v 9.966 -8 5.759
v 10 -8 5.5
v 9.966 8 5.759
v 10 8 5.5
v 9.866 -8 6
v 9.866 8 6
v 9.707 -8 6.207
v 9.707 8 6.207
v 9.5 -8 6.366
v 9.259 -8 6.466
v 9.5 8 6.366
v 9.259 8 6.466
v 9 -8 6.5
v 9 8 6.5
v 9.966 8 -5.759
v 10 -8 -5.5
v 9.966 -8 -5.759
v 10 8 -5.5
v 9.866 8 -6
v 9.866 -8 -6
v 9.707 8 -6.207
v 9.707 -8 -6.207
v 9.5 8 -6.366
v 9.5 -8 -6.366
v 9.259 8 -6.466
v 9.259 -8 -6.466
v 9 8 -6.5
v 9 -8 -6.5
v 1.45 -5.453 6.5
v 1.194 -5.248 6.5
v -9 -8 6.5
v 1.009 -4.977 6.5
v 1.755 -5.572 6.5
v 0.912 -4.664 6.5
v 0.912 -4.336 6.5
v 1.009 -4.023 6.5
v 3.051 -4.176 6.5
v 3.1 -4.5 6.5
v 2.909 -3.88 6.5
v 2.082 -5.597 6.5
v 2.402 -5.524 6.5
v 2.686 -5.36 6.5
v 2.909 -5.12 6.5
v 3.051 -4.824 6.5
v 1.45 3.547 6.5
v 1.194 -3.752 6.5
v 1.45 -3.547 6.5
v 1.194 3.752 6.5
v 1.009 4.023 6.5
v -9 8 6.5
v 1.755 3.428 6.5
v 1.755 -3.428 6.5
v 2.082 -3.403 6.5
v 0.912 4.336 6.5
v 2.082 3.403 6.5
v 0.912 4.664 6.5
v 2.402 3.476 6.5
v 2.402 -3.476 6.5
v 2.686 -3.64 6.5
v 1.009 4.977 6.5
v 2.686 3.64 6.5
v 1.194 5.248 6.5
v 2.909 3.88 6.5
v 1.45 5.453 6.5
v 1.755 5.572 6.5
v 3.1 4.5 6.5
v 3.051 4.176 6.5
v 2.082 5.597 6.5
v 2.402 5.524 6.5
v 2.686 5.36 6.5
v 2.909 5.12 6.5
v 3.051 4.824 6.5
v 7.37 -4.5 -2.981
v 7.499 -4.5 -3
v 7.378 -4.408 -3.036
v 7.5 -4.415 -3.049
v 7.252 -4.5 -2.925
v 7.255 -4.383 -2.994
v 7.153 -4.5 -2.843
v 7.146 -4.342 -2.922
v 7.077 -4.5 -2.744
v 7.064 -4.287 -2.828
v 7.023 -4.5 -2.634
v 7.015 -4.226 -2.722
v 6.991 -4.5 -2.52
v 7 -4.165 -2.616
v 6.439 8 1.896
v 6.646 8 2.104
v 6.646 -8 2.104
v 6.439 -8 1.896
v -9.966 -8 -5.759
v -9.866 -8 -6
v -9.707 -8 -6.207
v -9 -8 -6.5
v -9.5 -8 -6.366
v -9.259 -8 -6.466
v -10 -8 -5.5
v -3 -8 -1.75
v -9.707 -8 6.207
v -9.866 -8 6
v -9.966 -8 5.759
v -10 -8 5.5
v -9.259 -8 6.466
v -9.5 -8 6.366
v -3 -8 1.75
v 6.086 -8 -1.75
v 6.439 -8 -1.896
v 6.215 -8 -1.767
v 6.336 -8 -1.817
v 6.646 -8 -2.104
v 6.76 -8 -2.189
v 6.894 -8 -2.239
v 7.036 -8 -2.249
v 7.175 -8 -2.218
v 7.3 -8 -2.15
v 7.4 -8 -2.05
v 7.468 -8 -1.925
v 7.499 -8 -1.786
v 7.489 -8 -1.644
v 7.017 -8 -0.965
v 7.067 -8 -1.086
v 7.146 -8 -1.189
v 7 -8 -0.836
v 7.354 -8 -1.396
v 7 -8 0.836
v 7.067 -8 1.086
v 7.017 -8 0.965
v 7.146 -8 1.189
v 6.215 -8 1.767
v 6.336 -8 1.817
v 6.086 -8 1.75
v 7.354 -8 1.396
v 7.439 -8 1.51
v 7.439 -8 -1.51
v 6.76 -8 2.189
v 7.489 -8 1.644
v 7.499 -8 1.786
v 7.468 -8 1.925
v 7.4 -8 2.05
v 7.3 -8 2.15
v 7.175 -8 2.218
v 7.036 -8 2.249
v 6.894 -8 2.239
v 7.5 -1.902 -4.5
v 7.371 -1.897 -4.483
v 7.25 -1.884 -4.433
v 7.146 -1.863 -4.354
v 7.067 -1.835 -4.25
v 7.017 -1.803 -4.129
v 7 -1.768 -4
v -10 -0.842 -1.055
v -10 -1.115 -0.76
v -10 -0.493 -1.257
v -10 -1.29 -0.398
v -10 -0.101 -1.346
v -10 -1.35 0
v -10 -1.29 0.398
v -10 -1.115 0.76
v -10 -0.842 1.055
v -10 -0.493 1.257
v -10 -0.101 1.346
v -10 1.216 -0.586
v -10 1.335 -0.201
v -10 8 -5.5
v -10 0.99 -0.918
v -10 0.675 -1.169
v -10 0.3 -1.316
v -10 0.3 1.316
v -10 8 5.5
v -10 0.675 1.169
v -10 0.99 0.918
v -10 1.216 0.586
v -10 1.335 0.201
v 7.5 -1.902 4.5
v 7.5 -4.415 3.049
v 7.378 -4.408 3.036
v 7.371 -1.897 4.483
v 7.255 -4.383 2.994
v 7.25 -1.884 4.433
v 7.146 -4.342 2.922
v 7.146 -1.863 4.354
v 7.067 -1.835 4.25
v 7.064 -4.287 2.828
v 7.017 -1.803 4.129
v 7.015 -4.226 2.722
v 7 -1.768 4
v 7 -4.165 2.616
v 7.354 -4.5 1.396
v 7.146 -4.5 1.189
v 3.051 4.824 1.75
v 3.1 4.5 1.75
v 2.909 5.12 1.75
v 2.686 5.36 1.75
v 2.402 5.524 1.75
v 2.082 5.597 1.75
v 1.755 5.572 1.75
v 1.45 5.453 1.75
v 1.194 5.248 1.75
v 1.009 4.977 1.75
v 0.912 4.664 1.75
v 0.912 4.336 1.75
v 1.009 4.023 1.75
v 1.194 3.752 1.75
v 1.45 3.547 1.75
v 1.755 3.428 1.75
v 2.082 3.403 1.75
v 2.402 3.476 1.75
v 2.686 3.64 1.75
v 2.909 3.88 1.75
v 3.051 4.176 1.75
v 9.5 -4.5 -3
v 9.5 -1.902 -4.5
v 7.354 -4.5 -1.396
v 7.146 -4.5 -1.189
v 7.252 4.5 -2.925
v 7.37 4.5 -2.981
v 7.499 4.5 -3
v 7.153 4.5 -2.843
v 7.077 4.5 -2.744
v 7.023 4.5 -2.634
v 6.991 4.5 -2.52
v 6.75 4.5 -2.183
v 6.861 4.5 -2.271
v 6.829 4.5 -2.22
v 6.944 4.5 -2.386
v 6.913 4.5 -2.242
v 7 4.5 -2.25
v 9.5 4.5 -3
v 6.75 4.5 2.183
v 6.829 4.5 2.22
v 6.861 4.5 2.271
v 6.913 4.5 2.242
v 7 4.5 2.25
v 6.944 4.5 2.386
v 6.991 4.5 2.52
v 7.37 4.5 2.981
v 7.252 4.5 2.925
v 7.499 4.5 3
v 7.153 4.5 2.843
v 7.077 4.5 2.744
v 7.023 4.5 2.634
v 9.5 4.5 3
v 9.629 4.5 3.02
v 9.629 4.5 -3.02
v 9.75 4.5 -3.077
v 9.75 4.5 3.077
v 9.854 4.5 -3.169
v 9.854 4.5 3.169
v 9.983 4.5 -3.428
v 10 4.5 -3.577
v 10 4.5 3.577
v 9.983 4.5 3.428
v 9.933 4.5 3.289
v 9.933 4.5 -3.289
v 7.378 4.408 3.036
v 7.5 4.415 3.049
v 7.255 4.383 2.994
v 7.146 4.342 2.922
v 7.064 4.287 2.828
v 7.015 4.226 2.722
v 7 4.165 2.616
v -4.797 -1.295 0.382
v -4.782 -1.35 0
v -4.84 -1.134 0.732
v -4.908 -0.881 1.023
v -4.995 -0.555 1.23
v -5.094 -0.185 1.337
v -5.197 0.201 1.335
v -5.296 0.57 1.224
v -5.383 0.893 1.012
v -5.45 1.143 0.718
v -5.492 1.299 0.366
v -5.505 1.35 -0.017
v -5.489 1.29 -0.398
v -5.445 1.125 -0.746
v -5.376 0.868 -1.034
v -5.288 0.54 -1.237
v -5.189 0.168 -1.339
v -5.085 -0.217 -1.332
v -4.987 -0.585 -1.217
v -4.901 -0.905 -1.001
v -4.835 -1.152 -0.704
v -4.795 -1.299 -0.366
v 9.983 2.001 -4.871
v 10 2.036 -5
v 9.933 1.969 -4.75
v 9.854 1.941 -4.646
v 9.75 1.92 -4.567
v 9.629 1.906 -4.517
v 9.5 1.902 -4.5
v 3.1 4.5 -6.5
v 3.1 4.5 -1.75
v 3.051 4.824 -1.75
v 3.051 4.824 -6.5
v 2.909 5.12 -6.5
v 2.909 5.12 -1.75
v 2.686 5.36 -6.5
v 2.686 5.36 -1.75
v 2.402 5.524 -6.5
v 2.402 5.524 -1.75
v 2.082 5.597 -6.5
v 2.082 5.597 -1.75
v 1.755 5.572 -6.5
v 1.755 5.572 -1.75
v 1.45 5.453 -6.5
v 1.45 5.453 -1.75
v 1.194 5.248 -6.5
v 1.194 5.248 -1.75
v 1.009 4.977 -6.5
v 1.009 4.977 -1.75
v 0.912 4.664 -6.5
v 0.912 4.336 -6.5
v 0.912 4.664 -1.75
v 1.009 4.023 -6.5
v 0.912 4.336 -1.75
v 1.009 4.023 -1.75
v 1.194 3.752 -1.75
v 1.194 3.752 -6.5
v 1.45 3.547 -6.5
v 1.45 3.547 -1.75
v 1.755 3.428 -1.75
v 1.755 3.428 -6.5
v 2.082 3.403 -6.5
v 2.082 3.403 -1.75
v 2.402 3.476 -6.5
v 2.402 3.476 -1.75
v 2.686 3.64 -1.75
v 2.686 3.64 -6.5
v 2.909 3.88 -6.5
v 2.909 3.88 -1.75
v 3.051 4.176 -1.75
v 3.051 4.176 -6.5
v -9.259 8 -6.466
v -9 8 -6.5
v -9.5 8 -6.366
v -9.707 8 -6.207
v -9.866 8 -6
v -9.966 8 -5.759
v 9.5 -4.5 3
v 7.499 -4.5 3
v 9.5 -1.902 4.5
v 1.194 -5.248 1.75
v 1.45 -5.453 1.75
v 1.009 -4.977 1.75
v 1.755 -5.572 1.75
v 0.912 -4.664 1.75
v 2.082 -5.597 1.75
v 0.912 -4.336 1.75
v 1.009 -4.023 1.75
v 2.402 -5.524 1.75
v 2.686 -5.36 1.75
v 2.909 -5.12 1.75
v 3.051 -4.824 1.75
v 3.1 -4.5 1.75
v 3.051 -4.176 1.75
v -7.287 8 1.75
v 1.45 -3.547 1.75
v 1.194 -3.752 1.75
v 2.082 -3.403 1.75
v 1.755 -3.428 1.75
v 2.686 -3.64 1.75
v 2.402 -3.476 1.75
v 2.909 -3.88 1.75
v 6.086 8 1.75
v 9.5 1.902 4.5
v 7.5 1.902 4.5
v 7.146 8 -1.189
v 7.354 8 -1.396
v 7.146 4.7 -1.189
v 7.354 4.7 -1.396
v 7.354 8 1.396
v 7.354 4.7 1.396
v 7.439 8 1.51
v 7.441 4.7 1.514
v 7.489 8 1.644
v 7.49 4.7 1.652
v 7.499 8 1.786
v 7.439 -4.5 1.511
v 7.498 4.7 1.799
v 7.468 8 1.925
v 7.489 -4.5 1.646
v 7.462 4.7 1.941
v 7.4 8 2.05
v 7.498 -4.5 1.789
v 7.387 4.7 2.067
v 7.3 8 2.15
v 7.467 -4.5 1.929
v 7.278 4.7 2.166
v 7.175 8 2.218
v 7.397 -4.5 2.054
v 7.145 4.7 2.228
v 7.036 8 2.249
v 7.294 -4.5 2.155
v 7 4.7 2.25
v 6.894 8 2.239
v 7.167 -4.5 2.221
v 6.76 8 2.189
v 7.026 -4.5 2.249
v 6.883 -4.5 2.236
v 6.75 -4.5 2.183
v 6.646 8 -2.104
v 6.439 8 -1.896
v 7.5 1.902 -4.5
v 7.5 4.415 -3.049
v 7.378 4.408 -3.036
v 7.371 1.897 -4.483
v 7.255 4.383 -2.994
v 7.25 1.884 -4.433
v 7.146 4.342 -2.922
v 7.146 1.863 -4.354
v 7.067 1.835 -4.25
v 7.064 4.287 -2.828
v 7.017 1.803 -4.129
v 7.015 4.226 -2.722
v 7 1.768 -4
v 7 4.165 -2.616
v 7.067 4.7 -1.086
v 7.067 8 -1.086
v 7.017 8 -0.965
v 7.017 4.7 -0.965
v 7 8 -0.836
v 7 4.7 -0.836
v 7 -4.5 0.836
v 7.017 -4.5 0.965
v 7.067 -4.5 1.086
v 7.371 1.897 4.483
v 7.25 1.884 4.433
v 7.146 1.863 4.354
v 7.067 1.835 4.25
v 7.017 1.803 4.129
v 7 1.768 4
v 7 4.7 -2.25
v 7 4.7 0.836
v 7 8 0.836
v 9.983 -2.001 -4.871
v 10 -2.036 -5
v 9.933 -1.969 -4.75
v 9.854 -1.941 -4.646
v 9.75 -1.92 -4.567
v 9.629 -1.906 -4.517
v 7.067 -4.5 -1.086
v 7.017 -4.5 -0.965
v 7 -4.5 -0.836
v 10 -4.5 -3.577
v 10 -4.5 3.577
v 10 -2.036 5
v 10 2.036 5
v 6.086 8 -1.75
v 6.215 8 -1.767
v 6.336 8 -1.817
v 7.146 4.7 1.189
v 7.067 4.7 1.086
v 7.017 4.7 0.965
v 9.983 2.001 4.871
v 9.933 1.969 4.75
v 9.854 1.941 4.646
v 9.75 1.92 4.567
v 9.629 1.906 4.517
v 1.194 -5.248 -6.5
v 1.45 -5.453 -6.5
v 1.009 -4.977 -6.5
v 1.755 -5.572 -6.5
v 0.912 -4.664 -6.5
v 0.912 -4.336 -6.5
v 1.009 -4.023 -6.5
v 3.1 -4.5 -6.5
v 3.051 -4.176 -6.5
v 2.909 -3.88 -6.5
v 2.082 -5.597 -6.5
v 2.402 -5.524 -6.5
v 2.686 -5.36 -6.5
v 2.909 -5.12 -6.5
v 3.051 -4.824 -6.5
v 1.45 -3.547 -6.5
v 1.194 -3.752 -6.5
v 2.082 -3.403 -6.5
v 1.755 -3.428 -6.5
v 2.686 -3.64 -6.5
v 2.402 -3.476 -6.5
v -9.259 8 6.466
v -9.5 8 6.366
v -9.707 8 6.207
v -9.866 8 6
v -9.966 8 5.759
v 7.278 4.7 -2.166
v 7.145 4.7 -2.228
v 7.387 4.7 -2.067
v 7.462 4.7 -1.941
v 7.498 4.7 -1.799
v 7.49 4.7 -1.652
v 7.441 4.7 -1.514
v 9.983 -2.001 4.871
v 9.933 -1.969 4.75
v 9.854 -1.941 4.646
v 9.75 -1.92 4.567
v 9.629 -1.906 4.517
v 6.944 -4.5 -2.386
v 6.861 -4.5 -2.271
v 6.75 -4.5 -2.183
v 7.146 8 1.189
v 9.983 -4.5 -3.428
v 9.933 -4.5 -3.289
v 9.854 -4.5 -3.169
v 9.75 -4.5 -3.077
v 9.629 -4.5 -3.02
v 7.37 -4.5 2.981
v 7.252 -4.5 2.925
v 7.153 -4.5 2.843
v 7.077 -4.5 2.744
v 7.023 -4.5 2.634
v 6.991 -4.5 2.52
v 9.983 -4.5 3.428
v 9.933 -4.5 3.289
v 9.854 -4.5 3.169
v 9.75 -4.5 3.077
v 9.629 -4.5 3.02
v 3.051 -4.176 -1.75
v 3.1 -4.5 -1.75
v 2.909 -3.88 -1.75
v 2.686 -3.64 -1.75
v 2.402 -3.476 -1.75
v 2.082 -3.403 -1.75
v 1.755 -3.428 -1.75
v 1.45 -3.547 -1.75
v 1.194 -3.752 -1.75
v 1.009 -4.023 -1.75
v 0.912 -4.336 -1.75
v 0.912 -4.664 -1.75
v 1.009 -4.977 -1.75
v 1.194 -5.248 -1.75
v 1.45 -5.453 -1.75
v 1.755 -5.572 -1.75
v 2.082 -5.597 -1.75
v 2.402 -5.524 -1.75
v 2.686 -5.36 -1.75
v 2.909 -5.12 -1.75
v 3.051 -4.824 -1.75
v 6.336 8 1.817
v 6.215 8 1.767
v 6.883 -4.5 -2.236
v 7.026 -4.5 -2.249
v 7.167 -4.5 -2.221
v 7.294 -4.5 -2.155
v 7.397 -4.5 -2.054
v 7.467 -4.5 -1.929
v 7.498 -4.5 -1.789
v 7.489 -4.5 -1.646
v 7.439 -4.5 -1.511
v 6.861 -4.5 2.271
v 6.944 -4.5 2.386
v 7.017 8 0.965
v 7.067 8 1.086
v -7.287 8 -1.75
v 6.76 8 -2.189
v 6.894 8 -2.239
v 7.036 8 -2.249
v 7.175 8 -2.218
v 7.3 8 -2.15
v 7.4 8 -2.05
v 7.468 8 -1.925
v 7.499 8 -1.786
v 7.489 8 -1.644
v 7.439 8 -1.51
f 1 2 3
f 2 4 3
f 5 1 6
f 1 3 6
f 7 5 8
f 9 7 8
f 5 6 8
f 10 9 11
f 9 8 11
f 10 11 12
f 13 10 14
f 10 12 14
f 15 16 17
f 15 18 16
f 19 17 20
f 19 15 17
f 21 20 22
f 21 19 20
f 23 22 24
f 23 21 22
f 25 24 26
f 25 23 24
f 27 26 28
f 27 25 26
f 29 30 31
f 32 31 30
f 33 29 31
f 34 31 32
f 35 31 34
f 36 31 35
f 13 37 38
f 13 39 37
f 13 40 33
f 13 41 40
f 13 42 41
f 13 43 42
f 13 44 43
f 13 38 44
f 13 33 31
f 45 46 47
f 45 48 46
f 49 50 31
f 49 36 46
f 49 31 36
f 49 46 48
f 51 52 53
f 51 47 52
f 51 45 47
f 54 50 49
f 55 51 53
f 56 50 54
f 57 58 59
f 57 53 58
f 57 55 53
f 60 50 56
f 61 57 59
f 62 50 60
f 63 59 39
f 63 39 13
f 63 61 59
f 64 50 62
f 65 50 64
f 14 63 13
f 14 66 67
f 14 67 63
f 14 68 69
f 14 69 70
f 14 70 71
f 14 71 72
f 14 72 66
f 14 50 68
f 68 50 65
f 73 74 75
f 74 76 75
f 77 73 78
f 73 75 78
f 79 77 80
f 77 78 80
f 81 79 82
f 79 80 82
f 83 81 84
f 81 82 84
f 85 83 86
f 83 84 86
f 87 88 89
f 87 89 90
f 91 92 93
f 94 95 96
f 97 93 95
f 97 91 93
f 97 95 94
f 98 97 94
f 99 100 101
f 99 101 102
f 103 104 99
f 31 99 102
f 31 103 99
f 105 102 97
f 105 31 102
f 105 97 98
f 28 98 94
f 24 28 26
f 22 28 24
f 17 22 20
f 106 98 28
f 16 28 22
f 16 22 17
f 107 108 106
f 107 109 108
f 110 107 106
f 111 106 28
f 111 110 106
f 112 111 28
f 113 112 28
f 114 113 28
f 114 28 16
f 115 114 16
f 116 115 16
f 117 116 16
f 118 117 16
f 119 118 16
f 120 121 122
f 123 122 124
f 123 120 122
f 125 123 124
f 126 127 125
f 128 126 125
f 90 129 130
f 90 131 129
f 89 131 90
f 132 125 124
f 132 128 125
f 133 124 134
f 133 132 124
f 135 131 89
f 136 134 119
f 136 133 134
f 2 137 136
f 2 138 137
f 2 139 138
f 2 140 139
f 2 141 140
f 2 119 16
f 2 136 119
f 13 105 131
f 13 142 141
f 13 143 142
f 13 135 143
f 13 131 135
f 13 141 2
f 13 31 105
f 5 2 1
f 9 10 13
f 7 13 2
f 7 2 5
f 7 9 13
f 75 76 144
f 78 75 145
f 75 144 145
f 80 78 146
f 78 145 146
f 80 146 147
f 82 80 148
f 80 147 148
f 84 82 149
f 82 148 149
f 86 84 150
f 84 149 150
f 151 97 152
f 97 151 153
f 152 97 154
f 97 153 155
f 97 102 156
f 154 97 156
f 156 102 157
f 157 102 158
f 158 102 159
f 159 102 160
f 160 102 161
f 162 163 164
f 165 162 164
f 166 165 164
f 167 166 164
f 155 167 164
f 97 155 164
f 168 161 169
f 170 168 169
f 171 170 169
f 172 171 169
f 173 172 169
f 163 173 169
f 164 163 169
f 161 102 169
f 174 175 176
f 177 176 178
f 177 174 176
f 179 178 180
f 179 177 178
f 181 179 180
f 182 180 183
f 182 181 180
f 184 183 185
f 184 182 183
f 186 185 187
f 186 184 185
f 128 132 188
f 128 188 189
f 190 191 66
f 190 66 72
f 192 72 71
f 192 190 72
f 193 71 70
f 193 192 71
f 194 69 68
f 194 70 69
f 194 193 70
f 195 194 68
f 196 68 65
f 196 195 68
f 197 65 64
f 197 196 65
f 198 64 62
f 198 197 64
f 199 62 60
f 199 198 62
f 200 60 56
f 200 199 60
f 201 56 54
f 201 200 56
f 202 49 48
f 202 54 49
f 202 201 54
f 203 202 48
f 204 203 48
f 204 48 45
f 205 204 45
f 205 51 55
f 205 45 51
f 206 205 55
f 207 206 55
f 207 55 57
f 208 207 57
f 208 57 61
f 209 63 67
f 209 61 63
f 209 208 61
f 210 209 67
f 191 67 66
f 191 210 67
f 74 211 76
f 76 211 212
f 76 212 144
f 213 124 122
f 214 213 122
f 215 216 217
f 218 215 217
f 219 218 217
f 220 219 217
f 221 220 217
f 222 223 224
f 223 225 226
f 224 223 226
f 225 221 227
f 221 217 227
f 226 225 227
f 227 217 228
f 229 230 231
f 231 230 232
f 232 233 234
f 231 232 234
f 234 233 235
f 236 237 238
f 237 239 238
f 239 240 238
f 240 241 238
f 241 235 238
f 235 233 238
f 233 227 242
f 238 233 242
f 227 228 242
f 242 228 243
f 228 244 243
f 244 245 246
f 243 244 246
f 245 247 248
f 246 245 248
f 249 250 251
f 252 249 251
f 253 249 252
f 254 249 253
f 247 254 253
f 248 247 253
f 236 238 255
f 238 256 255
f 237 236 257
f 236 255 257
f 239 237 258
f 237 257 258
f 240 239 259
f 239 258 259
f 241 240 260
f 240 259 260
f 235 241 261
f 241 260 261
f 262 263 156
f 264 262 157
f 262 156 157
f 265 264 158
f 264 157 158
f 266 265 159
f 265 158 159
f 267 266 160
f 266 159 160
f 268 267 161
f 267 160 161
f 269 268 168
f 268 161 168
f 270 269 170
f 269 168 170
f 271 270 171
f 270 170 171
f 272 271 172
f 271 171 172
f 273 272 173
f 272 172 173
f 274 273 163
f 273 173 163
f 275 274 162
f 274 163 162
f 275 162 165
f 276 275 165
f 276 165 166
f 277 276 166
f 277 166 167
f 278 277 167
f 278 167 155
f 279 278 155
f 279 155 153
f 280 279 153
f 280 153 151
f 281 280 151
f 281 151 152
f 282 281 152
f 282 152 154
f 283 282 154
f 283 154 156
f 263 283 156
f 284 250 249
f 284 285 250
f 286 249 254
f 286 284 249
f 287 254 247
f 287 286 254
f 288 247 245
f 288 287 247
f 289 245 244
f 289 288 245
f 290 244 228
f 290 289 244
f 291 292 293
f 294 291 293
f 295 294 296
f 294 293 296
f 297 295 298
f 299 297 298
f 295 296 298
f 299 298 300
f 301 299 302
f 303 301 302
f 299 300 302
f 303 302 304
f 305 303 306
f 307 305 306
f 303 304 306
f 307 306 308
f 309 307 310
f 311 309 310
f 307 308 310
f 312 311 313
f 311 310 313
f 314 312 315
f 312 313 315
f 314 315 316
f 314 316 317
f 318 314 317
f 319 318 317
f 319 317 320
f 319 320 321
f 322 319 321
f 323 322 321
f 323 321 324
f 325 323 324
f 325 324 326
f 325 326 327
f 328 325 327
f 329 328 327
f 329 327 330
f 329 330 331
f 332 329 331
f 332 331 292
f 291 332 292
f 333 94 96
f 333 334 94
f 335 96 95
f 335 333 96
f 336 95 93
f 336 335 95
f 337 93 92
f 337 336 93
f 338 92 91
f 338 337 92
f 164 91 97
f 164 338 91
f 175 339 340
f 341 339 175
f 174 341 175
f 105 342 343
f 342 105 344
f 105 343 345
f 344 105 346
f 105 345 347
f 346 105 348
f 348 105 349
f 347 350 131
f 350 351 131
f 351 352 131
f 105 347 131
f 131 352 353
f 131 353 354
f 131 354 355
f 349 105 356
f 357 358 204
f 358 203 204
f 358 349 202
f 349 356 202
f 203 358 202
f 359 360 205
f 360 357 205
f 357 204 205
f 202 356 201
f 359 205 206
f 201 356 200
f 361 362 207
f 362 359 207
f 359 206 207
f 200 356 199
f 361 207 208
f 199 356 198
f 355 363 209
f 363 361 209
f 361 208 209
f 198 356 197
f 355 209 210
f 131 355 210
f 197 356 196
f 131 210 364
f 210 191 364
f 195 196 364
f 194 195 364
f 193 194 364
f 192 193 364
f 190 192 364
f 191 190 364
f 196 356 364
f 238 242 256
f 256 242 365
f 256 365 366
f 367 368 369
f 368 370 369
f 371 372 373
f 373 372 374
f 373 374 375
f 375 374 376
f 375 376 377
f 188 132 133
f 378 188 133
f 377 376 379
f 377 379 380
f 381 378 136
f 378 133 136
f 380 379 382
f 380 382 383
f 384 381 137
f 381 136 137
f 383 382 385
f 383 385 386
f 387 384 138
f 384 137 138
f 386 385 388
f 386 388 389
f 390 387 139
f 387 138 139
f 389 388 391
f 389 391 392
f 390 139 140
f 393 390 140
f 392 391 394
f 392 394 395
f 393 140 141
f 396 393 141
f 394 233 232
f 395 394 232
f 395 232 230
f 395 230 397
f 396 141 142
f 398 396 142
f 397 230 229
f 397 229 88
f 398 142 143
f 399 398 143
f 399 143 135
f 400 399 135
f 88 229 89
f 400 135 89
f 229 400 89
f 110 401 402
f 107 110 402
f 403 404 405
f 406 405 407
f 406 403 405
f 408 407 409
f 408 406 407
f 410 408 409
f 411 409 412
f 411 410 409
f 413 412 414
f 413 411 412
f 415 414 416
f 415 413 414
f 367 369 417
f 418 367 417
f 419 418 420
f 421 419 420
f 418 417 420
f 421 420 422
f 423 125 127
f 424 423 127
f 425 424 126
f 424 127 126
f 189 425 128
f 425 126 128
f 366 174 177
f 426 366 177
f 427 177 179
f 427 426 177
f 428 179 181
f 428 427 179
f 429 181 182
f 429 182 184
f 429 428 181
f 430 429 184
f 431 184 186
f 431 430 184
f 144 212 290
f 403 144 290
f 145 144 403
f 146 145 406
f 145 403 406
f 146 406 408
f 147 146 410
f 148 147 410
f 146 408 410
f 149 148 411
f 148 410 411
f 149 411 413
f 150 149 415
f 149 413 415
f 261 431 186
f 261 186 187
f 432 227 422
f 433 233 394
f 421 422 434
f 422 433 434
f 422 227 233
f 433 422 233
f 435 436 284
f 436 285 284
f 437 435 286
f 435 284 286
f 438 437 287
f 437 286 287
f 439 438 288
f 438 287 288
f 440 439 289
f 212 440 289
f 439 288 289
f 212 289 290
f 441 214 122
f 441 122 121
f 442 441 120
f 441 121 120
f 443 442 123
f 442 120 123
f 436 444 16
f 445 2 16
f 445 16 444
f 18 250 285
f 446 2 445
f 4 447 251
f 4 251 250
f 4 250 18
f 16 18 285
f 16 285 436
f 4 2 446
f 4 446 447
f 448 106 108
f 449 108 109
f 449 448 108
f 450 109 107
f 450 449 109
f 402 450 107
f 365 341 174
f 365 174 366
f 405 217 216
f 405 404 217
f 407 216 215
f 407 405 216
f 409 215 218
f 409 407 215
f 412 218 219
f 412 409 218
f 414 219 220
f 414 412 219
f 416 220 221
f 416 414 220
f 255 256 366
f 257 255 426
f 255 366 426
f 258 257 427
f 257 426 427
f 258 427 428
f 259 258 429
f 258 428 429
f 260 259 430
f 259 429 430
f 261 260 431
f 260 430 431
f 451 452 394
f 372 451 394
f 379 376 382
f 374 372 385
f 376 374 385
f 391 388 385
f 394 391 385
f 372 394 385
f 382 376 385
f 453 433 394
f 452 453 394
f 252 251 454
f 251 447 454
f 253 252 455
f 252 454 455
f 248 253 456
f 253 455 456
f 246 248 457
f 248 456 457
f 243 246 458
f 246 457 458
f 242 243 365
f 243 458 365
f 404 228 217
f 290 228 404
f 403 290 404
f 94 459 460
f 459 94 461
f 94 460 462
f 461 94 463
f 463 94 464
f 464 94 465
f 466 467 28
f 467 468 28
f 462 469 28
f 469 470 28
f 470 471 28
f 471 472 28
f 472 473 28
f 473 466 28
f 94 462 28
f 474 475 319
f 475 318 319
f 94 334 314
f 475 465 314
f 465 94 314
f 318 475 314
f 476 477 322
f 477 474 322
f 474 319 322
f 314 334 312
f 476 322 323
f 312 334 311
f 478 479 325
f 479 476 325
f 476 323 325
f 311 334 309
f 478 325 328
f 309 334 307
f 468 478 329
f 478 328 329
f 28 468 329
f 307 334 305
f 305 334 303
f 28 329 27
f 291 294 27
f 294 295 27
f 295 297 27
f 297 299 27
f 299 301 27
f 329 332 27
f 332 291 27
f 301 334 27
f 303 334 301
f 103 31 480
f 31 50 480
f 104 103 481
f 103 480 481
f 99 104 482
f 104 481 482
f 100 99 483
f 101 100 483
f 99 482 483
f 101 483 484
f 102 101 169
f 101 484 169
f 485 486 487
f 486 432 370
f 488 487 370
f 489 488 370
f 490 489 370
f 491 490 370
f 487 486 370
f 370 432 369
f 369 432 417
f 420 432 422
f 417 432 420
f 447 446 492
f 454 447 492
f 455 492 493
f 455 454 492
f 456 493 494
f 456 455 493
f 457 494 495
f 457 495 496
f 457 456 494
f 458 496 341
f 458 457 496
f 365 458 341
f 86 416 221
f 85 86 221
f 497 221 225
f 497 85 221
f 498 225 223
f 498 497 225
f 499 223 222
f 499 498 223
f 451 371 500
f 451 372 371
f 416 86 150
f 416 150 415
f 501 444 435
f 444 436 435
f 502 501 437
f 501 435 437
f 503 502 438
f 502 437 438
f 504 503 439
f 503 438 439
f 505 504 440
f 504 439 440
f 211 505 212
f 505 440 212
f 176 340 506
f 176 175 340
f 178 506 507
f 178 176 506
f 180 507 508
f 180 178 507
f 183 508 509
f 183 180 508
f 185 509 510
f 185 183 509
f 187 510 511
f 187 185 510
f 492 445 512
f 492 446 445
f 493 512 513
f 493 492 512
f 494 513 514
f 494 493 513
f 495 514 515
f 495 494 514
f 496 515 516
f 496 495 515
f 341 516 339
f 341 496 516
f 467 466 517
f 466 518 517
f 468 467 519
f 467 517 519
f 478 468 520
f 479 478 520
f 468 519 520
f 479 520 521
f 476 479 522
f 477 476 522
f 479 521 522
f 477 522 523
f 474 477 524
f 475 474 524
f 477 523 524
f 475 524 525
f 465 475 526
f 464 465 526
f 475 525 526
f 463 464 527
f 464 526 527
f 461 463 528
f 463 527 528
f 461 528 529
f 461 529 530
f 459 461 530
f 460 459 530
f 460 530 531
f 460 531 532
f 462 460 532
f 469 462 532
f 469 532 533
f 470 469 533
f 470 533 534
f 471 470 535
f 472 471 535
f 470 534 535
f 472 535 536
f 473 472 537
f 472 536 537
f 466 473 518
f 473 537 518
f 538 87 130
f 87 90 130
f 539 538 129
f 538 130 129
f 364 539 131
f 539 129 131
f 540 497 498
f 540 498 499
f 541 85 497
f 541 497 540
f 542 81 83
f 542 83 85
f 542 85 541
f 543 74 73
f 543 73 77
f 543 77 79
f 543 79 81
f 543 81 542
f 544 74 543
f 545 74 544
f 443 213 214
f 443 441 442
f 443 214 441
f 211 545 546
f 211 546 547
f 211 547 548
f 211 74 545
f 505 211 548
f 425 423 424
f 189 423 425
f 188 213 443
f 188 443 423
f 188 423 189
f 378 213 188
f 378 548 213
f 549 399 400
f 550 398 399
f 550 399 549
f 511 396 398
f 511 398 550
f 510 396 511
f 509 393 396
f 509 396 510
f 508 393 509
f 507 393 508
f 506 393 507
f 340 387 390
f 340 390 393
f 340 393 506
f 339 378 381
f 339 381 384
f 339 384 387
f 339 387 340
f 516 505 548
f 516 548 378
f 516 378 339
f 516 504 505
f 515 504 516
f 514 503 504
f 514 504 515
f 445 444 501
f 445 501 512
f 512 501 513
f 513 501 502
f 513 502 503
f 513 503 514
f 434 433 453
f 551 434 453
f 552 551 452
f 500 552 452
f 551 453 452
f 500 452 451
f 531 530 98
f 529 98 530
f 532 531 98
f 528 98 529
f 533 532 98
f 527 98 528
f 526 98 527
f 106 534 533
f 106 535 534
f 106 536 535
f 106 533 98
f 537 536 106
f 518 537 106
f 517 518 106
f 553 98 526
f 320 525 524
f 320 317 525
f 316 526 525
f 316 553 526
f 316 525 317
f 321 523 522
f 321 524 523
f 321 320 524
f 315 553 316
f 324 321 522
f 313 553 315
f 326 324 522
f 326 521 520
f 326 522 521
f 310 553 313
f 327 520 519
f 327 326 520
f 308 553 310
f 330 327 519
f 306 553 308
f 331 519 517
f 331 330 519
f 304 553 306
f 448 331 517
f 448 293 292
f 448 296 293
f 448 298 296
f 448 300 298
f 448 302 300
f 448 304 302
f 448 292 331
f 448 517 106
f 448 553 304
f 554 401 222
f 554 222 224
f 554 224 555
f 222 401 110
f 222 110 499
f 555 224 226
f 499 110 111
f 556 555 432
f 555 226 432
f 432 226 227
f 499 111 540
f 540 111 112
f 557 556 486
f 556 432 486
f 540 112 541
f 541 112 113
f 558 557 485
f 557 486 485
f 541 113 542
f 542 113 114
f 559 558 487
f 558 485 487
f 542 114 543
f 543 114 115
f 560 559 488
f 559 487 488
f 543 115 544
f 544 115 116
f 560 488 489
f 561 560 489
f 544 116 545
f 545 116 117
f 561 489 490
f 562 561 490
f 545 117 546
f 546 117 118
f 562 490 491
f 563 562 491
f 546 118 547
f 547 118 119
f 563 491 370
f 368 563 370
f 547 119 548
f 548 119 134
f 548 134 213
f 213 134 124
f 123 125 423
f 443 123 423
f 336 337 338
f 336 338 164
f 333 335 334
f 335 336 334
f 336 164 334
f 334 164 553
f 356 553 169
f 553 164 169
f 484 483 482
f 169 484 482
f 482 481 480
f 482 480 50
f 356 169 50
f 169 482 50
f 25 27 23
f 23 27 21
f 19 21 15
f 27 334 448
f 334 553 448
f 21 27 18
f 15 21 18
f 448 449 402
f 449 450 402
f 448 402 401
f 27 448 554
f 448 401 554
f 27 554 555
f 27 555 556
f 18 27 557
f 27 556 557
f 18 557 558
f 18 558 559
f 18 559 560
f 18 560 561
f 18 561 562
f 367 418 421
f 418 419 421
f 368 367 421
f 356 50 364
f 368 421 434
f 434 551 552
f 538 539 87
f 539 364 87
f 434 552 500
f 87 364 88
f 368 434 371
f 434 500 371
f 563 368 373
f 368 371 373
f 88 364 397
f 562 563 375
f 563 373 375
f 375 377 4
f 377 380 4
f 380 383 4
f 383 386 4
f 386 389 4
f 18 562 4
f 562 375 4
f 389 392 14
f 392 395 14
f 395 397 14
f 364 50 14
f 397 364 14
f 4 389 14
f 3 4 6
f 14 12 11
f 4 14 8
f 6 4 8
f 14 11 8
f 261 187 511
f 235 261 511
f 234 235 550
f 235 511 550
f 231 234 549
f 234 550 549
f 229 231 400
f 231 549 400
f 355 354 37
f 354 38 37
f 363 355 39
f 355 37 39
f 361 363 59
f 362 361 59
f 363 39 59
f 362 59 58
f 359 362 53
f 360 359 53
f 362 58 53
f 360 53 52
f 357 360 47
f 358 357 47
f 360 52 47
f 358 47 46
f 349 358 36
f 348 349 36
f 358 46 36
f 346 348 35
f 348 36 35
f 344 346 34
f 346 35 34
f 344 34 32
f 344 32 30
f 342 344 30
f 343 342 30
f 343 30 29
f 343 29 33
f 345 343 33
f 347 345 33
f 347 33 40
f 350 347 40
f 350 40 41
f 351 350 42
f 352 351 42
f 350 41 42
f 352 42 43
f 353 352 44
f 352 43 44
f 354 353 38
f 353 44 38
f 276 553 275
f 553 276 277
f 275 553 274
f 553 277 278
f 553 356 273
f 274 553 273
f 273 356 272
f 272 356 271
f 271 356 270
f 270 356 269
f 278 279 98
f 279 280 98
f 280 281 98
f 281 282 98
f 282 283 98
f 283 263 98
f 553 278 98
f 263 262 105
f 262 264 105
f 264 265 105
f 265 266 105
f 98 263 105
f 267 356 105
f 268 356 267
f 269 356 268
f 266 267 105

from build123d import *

# Parameters (mm, degrees)
SKETCH_W        = 20
SKETCH_H        = 16
PAD_DEPTH       = 6.5
POCKET_DEPTH    = 1.75
POCKET002_DEPTH = 16.001
FILLET_R        = 0.5
SKETCH004_R     = 1.1
POCKET003_DEPTH = 8
SKETCH005_R     = 1.35
POCKET004_DEPTH = 7
SKETCH006_W     = 9
SKETCH006_H     = 9
POCKET005_DEPTH = 3
CHAMFER_1_ANGLE = 60
CHAMFER_1_SIZE  = 1.5
CHAMFER_2_ANGLE = 60
CHAMFER_2_SIZE  = 1.5
FILLET001_R     = 0.5
FILLET002_R     = 0.5
FILLET003_R     = 1
FILLET004_R     = 0.5
SKETCH007_W     = 2
SKETCH007_H     = 5
PAD001_DEPTH    = 0.2


with BuildPart() as part:
    # Sketch (on XY_Plane of Origin) → Pad (new body, symmetric)
    with BuildSketch(Plane.XY):
        Rectangle(SKETCH_W, SKETCH_H)
    extrude(amount=PAD_DEPTH, both=True)

    # Sketch001 → Pocket (cut, symmetric)
    with BuildSketch(Plane.XY):
        Polygon((-7.287187, 8), (-3, -8), (7, -8), (7, 8), align=None)
    extrude(amount=POCKET_DEPTH, both=True, mode=Mode.SUBTRACT)

    # Sketch003 (on Face1 of Pocket) → Pocket002 (cut, through all)
    with BuildSketch(Plane.XZ.offset(8)):
        with BuildLine():
            ThreePointArc((6.646447, -2.103553), (7.353553, -2.103553), (7.353553, -1.396447))
            Line((7.353553, -1.396447), (6.646447, -0.68934))
            ThreePointArc((6.646447, -0.68934), (5.93934, -0.68934), (5.93934, -1.396447))
            Line((6.646447, -2.103553), (5.93934, -1.396447))
        make_face()
        with BuildLine():
            ThreePointArc((7.353553, 1.396447), (7.353553, 2.103553), (6.646447, 2.103553))
            Line((6.646447, 2.103553), (5.93934, 1.396447))
            ThreePointArc((5.93934, 1.396447), (5.93934, 0.68934), (6.646447, 0.68934))
            Line((7.353553, 1.396447), (6.646447, 0.68934))
        make_face()
    extrude(amount=-POCKET002_DEPTH, mode=Mode.SUBTRACT)

    # Fillet
    fillet_edges = [part.edges().sort_by_distance(p)[0] for p in [
        (6.292893, 0, -1.75),
        (6.292893, 0, 1.75),
        (7, 0, -1.042893),
        (7, 0, 1.042893),
    ]]
    fillet(fillet_edges, radius=FILLET_R)

    # Sketch004 (on XY_Plane of Origin) → Pocket003 (cut, symmetric)
    with BuildSketch(Plane.XY):
        with Locations((2, 4.5)):
            Circle(SKETCH004_R)
        with Locations((2, -4.5)):
            Circle(SKETCH004_R)
    extrude(amount=POCKET003_DEPTH, both=True, mode=Mode.SUBTRACT)

    # Sketch005 (on Face16 of Pocket003) → Pocket004 (cut)
    with BuildSketch(Plane(origin=(-10, 0, 0), x_dir=(0, -1, 0), z_dir=(-1, 0, 0))):
        Circle(SKETCH005_R)
    extrude(amount=-POCKET004_DEPTH, mode=Mode.SUBTRACT)

    # Sketch006 (on Face19 of Pocket004) → Pocket005 (cut)
    with BuildSketch(Plane.YZ.offset(10)):
        Rectangle(SKETCH006_W, SKETCH006_H)
    extrude(amount=-POCKET005_DEPTH, mode=Mode.SUBTRACT)

    # Chamfer 1
    chamfer_1_edges = [part.edges().sort_by_distance(p)[0] for p in [
        (8.5, 4.5, -4.5),
        (8.5, 4.5, 4.5),
    ]]
    chamfer_1_side = part.faces().sort_by_distance((8.542167, 4.5, 0))[0]
    chamfer(chamfer_1_edges, length=CHAMFER_1_SIZE, angle=CHAMFER_1_ANGLE, reference=chamfer_1_side)

    # Chamfer 2
    chamfer_2_edges = [part.edges().sort_by_distance(p)[0] for p in [
        (8.5, -4.5, -4.5),
        (8.5, -4.5, 4.5),
    ]]
    chamfer_2_side = part.faces().sort_by_distance((8.542167, -4.5, 0))[0]
    chamfer(chamfer_2_edges, length=CHAMFER_2_SIZE, angle=CHAMFER_2_ANGLE, reference=chamfer_2_side)

    # Fillet001
    fillet001_edges = [part.edges().sort_by_distance(p)[0] for p in [
        (7, 0, 2.25),
        (7, 0, -2.25),
    ]]
    fillet(fillet001_edges, radius=FILLET001_R)

    # Fillet002
    fillet002_edges = [part.edges().sort_by_distance(p)[0] for p in [
        (7, -3.200962, -3.75),
        (7, 0, -4.5),
        (7, 3.200962, -3.75),
        (7, -3.200962, 3.75),
        (7, 0, 4.5),
        (7, 3.200962, 3.75),
    ]]
    fillet(fillet002_edges, radius=FILLET002_R)

    # Fillet003
    fillet003_edges = [part.edges().sort_by_distance(p)[0] for p in [
        (10, 0, 6.5),
        (-10, 0, 6.5),
        (-10, 0, -6.5),
        (10, 0, -6.5),
    ]]
    fillet(fillet003_edges, radius=FILLET003_R)

    # Fillet004
    fillet004_edges = [part.edges().sort_by_distance(p)[0] for p in [
        (10, -3.200962, -3.75),
        (10, 0, -4.5),
        (10, 3.200962, -3.75),
        (10, 3.200962, 3.75),
        (10, 0, 4.5),
        (10, -3.200962, 3.75),
    ]]
    fillet(fillet004_edges, radius=FILLET004_R)

    # Sketch007 (on Face8 of Fillet004) → Pad001 (join)
    with BuildSketch(Plane.XZ.offset(-4.5)):
        with Locations((8, 0)):
            Rectangle(SKETCH007_W, SKETCH007_H)
    extrude(amount=-PAD001_DEPTH)


solid = part.part
